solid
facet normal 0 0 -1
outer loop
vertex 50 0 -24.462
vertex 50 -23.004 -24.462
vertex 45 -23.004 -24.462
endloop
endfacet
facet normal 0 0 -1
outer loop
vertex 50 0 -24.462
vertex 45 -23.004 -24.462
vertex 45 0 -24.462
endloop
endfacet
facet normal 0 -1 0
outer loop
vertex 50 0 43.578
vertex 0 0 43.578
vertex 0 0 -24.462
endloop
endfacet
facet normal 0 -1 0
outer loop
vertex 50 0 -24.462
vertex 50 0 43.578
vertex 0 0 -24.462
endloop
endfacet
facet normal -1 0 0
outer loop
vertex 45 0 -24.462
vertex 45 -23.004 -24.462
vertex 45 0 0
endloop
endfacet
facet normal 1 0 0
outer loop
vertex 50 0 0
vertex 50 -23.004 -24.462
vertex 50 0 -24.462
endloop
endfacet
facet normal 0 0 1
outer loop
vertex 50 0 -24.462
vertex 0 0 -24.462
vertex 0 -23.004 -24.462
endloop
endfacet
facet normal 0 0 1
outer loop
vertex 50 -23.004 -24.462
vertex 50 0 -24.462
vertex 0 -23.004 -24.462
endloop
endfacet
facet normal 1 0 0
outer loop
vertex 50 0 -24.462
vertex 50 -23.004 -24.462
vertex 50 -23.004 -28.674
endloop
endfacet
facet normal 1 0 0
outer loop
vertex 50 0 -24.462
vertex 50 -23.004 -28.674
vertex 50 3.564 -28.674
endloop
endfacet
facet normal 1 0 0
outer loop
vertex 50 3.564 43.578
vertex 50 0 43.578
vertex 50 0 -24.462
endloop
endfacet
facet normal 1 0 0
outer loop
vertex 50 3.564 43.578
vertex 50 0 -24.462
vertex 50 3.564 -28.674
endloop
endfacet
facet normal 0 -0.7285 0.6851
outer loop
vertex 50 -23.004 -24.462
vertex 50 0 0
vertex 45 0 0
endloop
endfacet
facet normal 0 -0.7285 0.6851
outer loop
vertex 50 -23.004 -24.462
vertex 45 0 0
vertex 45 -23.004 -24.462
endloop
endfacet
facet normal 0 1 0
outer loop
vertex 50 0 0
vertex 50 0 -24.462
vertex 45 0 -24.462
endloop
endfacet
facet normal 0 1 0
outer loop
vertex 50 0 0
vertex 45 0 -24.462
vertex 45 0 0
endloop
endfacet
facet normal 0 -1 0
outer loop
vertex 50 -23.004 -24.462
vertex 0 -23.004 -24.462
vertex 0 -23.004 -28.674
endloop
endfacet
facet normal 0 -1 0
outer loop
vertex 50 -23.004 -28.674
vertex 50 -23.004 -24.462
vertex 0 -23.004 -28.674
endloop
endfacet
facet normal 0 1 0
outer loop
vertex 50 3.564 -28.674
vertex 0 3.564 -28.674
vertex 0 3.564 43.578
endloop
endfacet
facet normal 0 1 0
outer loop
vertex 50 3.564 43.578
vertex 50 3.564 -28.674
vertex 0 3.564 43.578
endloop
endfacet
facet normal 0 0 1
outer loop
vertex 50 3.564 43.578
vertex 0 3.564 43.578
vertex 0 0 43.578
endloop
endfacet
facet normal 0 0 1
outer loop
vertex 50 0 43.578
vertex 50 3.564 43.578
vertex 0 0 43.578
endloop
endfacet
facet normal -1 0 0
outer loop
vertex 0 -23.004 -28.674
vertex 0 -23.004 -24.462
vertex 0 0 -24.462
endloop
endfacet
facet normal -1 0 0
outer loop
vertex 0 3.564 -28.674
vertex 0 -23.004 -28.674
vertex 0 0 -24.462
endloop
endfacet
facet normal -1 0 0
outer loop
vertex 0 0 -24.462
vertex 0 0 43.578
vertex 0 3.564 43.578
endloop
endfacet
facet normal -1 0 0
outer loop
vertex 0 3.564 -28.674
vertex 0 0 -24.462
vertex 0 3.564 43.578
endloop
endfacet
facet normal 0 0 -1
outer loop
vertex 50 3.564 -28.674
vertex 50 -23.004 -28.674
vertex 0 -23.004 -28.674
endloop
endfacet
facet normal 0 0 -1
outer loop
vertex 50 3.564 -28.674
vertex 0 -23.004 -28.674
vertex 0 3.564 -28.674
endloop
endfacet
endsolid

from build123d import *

# Parameters (mm, degrees)
F1_DEPTH = 50
F3_DEPTH = 5


with BuildPart() as f1:
    # F0 (on Right) → F1 (new body)
    with BuildSketch(Plane.YZ):
        Polygon((3.564021, 43.578271), (0, 43.578271), (0, -24.462152), (-23.004144, -24.462152), (-23.004144, -28.674178), (3.564021, -28.674178), align=None)
    extrude(amount=F1_DEPTH)


with BuildPart() as f3:
    # F2 (on face) → F3 (new body)
    with BuildSketch(Plane.YZ.offset(50)):
        Polygon((0, -24.462152), (0, 0), (-23.004144, -24.462152), align=None)
    extrude(amount=-F3_DEPTH)


solid = Compound([f1.part, f3.part])
